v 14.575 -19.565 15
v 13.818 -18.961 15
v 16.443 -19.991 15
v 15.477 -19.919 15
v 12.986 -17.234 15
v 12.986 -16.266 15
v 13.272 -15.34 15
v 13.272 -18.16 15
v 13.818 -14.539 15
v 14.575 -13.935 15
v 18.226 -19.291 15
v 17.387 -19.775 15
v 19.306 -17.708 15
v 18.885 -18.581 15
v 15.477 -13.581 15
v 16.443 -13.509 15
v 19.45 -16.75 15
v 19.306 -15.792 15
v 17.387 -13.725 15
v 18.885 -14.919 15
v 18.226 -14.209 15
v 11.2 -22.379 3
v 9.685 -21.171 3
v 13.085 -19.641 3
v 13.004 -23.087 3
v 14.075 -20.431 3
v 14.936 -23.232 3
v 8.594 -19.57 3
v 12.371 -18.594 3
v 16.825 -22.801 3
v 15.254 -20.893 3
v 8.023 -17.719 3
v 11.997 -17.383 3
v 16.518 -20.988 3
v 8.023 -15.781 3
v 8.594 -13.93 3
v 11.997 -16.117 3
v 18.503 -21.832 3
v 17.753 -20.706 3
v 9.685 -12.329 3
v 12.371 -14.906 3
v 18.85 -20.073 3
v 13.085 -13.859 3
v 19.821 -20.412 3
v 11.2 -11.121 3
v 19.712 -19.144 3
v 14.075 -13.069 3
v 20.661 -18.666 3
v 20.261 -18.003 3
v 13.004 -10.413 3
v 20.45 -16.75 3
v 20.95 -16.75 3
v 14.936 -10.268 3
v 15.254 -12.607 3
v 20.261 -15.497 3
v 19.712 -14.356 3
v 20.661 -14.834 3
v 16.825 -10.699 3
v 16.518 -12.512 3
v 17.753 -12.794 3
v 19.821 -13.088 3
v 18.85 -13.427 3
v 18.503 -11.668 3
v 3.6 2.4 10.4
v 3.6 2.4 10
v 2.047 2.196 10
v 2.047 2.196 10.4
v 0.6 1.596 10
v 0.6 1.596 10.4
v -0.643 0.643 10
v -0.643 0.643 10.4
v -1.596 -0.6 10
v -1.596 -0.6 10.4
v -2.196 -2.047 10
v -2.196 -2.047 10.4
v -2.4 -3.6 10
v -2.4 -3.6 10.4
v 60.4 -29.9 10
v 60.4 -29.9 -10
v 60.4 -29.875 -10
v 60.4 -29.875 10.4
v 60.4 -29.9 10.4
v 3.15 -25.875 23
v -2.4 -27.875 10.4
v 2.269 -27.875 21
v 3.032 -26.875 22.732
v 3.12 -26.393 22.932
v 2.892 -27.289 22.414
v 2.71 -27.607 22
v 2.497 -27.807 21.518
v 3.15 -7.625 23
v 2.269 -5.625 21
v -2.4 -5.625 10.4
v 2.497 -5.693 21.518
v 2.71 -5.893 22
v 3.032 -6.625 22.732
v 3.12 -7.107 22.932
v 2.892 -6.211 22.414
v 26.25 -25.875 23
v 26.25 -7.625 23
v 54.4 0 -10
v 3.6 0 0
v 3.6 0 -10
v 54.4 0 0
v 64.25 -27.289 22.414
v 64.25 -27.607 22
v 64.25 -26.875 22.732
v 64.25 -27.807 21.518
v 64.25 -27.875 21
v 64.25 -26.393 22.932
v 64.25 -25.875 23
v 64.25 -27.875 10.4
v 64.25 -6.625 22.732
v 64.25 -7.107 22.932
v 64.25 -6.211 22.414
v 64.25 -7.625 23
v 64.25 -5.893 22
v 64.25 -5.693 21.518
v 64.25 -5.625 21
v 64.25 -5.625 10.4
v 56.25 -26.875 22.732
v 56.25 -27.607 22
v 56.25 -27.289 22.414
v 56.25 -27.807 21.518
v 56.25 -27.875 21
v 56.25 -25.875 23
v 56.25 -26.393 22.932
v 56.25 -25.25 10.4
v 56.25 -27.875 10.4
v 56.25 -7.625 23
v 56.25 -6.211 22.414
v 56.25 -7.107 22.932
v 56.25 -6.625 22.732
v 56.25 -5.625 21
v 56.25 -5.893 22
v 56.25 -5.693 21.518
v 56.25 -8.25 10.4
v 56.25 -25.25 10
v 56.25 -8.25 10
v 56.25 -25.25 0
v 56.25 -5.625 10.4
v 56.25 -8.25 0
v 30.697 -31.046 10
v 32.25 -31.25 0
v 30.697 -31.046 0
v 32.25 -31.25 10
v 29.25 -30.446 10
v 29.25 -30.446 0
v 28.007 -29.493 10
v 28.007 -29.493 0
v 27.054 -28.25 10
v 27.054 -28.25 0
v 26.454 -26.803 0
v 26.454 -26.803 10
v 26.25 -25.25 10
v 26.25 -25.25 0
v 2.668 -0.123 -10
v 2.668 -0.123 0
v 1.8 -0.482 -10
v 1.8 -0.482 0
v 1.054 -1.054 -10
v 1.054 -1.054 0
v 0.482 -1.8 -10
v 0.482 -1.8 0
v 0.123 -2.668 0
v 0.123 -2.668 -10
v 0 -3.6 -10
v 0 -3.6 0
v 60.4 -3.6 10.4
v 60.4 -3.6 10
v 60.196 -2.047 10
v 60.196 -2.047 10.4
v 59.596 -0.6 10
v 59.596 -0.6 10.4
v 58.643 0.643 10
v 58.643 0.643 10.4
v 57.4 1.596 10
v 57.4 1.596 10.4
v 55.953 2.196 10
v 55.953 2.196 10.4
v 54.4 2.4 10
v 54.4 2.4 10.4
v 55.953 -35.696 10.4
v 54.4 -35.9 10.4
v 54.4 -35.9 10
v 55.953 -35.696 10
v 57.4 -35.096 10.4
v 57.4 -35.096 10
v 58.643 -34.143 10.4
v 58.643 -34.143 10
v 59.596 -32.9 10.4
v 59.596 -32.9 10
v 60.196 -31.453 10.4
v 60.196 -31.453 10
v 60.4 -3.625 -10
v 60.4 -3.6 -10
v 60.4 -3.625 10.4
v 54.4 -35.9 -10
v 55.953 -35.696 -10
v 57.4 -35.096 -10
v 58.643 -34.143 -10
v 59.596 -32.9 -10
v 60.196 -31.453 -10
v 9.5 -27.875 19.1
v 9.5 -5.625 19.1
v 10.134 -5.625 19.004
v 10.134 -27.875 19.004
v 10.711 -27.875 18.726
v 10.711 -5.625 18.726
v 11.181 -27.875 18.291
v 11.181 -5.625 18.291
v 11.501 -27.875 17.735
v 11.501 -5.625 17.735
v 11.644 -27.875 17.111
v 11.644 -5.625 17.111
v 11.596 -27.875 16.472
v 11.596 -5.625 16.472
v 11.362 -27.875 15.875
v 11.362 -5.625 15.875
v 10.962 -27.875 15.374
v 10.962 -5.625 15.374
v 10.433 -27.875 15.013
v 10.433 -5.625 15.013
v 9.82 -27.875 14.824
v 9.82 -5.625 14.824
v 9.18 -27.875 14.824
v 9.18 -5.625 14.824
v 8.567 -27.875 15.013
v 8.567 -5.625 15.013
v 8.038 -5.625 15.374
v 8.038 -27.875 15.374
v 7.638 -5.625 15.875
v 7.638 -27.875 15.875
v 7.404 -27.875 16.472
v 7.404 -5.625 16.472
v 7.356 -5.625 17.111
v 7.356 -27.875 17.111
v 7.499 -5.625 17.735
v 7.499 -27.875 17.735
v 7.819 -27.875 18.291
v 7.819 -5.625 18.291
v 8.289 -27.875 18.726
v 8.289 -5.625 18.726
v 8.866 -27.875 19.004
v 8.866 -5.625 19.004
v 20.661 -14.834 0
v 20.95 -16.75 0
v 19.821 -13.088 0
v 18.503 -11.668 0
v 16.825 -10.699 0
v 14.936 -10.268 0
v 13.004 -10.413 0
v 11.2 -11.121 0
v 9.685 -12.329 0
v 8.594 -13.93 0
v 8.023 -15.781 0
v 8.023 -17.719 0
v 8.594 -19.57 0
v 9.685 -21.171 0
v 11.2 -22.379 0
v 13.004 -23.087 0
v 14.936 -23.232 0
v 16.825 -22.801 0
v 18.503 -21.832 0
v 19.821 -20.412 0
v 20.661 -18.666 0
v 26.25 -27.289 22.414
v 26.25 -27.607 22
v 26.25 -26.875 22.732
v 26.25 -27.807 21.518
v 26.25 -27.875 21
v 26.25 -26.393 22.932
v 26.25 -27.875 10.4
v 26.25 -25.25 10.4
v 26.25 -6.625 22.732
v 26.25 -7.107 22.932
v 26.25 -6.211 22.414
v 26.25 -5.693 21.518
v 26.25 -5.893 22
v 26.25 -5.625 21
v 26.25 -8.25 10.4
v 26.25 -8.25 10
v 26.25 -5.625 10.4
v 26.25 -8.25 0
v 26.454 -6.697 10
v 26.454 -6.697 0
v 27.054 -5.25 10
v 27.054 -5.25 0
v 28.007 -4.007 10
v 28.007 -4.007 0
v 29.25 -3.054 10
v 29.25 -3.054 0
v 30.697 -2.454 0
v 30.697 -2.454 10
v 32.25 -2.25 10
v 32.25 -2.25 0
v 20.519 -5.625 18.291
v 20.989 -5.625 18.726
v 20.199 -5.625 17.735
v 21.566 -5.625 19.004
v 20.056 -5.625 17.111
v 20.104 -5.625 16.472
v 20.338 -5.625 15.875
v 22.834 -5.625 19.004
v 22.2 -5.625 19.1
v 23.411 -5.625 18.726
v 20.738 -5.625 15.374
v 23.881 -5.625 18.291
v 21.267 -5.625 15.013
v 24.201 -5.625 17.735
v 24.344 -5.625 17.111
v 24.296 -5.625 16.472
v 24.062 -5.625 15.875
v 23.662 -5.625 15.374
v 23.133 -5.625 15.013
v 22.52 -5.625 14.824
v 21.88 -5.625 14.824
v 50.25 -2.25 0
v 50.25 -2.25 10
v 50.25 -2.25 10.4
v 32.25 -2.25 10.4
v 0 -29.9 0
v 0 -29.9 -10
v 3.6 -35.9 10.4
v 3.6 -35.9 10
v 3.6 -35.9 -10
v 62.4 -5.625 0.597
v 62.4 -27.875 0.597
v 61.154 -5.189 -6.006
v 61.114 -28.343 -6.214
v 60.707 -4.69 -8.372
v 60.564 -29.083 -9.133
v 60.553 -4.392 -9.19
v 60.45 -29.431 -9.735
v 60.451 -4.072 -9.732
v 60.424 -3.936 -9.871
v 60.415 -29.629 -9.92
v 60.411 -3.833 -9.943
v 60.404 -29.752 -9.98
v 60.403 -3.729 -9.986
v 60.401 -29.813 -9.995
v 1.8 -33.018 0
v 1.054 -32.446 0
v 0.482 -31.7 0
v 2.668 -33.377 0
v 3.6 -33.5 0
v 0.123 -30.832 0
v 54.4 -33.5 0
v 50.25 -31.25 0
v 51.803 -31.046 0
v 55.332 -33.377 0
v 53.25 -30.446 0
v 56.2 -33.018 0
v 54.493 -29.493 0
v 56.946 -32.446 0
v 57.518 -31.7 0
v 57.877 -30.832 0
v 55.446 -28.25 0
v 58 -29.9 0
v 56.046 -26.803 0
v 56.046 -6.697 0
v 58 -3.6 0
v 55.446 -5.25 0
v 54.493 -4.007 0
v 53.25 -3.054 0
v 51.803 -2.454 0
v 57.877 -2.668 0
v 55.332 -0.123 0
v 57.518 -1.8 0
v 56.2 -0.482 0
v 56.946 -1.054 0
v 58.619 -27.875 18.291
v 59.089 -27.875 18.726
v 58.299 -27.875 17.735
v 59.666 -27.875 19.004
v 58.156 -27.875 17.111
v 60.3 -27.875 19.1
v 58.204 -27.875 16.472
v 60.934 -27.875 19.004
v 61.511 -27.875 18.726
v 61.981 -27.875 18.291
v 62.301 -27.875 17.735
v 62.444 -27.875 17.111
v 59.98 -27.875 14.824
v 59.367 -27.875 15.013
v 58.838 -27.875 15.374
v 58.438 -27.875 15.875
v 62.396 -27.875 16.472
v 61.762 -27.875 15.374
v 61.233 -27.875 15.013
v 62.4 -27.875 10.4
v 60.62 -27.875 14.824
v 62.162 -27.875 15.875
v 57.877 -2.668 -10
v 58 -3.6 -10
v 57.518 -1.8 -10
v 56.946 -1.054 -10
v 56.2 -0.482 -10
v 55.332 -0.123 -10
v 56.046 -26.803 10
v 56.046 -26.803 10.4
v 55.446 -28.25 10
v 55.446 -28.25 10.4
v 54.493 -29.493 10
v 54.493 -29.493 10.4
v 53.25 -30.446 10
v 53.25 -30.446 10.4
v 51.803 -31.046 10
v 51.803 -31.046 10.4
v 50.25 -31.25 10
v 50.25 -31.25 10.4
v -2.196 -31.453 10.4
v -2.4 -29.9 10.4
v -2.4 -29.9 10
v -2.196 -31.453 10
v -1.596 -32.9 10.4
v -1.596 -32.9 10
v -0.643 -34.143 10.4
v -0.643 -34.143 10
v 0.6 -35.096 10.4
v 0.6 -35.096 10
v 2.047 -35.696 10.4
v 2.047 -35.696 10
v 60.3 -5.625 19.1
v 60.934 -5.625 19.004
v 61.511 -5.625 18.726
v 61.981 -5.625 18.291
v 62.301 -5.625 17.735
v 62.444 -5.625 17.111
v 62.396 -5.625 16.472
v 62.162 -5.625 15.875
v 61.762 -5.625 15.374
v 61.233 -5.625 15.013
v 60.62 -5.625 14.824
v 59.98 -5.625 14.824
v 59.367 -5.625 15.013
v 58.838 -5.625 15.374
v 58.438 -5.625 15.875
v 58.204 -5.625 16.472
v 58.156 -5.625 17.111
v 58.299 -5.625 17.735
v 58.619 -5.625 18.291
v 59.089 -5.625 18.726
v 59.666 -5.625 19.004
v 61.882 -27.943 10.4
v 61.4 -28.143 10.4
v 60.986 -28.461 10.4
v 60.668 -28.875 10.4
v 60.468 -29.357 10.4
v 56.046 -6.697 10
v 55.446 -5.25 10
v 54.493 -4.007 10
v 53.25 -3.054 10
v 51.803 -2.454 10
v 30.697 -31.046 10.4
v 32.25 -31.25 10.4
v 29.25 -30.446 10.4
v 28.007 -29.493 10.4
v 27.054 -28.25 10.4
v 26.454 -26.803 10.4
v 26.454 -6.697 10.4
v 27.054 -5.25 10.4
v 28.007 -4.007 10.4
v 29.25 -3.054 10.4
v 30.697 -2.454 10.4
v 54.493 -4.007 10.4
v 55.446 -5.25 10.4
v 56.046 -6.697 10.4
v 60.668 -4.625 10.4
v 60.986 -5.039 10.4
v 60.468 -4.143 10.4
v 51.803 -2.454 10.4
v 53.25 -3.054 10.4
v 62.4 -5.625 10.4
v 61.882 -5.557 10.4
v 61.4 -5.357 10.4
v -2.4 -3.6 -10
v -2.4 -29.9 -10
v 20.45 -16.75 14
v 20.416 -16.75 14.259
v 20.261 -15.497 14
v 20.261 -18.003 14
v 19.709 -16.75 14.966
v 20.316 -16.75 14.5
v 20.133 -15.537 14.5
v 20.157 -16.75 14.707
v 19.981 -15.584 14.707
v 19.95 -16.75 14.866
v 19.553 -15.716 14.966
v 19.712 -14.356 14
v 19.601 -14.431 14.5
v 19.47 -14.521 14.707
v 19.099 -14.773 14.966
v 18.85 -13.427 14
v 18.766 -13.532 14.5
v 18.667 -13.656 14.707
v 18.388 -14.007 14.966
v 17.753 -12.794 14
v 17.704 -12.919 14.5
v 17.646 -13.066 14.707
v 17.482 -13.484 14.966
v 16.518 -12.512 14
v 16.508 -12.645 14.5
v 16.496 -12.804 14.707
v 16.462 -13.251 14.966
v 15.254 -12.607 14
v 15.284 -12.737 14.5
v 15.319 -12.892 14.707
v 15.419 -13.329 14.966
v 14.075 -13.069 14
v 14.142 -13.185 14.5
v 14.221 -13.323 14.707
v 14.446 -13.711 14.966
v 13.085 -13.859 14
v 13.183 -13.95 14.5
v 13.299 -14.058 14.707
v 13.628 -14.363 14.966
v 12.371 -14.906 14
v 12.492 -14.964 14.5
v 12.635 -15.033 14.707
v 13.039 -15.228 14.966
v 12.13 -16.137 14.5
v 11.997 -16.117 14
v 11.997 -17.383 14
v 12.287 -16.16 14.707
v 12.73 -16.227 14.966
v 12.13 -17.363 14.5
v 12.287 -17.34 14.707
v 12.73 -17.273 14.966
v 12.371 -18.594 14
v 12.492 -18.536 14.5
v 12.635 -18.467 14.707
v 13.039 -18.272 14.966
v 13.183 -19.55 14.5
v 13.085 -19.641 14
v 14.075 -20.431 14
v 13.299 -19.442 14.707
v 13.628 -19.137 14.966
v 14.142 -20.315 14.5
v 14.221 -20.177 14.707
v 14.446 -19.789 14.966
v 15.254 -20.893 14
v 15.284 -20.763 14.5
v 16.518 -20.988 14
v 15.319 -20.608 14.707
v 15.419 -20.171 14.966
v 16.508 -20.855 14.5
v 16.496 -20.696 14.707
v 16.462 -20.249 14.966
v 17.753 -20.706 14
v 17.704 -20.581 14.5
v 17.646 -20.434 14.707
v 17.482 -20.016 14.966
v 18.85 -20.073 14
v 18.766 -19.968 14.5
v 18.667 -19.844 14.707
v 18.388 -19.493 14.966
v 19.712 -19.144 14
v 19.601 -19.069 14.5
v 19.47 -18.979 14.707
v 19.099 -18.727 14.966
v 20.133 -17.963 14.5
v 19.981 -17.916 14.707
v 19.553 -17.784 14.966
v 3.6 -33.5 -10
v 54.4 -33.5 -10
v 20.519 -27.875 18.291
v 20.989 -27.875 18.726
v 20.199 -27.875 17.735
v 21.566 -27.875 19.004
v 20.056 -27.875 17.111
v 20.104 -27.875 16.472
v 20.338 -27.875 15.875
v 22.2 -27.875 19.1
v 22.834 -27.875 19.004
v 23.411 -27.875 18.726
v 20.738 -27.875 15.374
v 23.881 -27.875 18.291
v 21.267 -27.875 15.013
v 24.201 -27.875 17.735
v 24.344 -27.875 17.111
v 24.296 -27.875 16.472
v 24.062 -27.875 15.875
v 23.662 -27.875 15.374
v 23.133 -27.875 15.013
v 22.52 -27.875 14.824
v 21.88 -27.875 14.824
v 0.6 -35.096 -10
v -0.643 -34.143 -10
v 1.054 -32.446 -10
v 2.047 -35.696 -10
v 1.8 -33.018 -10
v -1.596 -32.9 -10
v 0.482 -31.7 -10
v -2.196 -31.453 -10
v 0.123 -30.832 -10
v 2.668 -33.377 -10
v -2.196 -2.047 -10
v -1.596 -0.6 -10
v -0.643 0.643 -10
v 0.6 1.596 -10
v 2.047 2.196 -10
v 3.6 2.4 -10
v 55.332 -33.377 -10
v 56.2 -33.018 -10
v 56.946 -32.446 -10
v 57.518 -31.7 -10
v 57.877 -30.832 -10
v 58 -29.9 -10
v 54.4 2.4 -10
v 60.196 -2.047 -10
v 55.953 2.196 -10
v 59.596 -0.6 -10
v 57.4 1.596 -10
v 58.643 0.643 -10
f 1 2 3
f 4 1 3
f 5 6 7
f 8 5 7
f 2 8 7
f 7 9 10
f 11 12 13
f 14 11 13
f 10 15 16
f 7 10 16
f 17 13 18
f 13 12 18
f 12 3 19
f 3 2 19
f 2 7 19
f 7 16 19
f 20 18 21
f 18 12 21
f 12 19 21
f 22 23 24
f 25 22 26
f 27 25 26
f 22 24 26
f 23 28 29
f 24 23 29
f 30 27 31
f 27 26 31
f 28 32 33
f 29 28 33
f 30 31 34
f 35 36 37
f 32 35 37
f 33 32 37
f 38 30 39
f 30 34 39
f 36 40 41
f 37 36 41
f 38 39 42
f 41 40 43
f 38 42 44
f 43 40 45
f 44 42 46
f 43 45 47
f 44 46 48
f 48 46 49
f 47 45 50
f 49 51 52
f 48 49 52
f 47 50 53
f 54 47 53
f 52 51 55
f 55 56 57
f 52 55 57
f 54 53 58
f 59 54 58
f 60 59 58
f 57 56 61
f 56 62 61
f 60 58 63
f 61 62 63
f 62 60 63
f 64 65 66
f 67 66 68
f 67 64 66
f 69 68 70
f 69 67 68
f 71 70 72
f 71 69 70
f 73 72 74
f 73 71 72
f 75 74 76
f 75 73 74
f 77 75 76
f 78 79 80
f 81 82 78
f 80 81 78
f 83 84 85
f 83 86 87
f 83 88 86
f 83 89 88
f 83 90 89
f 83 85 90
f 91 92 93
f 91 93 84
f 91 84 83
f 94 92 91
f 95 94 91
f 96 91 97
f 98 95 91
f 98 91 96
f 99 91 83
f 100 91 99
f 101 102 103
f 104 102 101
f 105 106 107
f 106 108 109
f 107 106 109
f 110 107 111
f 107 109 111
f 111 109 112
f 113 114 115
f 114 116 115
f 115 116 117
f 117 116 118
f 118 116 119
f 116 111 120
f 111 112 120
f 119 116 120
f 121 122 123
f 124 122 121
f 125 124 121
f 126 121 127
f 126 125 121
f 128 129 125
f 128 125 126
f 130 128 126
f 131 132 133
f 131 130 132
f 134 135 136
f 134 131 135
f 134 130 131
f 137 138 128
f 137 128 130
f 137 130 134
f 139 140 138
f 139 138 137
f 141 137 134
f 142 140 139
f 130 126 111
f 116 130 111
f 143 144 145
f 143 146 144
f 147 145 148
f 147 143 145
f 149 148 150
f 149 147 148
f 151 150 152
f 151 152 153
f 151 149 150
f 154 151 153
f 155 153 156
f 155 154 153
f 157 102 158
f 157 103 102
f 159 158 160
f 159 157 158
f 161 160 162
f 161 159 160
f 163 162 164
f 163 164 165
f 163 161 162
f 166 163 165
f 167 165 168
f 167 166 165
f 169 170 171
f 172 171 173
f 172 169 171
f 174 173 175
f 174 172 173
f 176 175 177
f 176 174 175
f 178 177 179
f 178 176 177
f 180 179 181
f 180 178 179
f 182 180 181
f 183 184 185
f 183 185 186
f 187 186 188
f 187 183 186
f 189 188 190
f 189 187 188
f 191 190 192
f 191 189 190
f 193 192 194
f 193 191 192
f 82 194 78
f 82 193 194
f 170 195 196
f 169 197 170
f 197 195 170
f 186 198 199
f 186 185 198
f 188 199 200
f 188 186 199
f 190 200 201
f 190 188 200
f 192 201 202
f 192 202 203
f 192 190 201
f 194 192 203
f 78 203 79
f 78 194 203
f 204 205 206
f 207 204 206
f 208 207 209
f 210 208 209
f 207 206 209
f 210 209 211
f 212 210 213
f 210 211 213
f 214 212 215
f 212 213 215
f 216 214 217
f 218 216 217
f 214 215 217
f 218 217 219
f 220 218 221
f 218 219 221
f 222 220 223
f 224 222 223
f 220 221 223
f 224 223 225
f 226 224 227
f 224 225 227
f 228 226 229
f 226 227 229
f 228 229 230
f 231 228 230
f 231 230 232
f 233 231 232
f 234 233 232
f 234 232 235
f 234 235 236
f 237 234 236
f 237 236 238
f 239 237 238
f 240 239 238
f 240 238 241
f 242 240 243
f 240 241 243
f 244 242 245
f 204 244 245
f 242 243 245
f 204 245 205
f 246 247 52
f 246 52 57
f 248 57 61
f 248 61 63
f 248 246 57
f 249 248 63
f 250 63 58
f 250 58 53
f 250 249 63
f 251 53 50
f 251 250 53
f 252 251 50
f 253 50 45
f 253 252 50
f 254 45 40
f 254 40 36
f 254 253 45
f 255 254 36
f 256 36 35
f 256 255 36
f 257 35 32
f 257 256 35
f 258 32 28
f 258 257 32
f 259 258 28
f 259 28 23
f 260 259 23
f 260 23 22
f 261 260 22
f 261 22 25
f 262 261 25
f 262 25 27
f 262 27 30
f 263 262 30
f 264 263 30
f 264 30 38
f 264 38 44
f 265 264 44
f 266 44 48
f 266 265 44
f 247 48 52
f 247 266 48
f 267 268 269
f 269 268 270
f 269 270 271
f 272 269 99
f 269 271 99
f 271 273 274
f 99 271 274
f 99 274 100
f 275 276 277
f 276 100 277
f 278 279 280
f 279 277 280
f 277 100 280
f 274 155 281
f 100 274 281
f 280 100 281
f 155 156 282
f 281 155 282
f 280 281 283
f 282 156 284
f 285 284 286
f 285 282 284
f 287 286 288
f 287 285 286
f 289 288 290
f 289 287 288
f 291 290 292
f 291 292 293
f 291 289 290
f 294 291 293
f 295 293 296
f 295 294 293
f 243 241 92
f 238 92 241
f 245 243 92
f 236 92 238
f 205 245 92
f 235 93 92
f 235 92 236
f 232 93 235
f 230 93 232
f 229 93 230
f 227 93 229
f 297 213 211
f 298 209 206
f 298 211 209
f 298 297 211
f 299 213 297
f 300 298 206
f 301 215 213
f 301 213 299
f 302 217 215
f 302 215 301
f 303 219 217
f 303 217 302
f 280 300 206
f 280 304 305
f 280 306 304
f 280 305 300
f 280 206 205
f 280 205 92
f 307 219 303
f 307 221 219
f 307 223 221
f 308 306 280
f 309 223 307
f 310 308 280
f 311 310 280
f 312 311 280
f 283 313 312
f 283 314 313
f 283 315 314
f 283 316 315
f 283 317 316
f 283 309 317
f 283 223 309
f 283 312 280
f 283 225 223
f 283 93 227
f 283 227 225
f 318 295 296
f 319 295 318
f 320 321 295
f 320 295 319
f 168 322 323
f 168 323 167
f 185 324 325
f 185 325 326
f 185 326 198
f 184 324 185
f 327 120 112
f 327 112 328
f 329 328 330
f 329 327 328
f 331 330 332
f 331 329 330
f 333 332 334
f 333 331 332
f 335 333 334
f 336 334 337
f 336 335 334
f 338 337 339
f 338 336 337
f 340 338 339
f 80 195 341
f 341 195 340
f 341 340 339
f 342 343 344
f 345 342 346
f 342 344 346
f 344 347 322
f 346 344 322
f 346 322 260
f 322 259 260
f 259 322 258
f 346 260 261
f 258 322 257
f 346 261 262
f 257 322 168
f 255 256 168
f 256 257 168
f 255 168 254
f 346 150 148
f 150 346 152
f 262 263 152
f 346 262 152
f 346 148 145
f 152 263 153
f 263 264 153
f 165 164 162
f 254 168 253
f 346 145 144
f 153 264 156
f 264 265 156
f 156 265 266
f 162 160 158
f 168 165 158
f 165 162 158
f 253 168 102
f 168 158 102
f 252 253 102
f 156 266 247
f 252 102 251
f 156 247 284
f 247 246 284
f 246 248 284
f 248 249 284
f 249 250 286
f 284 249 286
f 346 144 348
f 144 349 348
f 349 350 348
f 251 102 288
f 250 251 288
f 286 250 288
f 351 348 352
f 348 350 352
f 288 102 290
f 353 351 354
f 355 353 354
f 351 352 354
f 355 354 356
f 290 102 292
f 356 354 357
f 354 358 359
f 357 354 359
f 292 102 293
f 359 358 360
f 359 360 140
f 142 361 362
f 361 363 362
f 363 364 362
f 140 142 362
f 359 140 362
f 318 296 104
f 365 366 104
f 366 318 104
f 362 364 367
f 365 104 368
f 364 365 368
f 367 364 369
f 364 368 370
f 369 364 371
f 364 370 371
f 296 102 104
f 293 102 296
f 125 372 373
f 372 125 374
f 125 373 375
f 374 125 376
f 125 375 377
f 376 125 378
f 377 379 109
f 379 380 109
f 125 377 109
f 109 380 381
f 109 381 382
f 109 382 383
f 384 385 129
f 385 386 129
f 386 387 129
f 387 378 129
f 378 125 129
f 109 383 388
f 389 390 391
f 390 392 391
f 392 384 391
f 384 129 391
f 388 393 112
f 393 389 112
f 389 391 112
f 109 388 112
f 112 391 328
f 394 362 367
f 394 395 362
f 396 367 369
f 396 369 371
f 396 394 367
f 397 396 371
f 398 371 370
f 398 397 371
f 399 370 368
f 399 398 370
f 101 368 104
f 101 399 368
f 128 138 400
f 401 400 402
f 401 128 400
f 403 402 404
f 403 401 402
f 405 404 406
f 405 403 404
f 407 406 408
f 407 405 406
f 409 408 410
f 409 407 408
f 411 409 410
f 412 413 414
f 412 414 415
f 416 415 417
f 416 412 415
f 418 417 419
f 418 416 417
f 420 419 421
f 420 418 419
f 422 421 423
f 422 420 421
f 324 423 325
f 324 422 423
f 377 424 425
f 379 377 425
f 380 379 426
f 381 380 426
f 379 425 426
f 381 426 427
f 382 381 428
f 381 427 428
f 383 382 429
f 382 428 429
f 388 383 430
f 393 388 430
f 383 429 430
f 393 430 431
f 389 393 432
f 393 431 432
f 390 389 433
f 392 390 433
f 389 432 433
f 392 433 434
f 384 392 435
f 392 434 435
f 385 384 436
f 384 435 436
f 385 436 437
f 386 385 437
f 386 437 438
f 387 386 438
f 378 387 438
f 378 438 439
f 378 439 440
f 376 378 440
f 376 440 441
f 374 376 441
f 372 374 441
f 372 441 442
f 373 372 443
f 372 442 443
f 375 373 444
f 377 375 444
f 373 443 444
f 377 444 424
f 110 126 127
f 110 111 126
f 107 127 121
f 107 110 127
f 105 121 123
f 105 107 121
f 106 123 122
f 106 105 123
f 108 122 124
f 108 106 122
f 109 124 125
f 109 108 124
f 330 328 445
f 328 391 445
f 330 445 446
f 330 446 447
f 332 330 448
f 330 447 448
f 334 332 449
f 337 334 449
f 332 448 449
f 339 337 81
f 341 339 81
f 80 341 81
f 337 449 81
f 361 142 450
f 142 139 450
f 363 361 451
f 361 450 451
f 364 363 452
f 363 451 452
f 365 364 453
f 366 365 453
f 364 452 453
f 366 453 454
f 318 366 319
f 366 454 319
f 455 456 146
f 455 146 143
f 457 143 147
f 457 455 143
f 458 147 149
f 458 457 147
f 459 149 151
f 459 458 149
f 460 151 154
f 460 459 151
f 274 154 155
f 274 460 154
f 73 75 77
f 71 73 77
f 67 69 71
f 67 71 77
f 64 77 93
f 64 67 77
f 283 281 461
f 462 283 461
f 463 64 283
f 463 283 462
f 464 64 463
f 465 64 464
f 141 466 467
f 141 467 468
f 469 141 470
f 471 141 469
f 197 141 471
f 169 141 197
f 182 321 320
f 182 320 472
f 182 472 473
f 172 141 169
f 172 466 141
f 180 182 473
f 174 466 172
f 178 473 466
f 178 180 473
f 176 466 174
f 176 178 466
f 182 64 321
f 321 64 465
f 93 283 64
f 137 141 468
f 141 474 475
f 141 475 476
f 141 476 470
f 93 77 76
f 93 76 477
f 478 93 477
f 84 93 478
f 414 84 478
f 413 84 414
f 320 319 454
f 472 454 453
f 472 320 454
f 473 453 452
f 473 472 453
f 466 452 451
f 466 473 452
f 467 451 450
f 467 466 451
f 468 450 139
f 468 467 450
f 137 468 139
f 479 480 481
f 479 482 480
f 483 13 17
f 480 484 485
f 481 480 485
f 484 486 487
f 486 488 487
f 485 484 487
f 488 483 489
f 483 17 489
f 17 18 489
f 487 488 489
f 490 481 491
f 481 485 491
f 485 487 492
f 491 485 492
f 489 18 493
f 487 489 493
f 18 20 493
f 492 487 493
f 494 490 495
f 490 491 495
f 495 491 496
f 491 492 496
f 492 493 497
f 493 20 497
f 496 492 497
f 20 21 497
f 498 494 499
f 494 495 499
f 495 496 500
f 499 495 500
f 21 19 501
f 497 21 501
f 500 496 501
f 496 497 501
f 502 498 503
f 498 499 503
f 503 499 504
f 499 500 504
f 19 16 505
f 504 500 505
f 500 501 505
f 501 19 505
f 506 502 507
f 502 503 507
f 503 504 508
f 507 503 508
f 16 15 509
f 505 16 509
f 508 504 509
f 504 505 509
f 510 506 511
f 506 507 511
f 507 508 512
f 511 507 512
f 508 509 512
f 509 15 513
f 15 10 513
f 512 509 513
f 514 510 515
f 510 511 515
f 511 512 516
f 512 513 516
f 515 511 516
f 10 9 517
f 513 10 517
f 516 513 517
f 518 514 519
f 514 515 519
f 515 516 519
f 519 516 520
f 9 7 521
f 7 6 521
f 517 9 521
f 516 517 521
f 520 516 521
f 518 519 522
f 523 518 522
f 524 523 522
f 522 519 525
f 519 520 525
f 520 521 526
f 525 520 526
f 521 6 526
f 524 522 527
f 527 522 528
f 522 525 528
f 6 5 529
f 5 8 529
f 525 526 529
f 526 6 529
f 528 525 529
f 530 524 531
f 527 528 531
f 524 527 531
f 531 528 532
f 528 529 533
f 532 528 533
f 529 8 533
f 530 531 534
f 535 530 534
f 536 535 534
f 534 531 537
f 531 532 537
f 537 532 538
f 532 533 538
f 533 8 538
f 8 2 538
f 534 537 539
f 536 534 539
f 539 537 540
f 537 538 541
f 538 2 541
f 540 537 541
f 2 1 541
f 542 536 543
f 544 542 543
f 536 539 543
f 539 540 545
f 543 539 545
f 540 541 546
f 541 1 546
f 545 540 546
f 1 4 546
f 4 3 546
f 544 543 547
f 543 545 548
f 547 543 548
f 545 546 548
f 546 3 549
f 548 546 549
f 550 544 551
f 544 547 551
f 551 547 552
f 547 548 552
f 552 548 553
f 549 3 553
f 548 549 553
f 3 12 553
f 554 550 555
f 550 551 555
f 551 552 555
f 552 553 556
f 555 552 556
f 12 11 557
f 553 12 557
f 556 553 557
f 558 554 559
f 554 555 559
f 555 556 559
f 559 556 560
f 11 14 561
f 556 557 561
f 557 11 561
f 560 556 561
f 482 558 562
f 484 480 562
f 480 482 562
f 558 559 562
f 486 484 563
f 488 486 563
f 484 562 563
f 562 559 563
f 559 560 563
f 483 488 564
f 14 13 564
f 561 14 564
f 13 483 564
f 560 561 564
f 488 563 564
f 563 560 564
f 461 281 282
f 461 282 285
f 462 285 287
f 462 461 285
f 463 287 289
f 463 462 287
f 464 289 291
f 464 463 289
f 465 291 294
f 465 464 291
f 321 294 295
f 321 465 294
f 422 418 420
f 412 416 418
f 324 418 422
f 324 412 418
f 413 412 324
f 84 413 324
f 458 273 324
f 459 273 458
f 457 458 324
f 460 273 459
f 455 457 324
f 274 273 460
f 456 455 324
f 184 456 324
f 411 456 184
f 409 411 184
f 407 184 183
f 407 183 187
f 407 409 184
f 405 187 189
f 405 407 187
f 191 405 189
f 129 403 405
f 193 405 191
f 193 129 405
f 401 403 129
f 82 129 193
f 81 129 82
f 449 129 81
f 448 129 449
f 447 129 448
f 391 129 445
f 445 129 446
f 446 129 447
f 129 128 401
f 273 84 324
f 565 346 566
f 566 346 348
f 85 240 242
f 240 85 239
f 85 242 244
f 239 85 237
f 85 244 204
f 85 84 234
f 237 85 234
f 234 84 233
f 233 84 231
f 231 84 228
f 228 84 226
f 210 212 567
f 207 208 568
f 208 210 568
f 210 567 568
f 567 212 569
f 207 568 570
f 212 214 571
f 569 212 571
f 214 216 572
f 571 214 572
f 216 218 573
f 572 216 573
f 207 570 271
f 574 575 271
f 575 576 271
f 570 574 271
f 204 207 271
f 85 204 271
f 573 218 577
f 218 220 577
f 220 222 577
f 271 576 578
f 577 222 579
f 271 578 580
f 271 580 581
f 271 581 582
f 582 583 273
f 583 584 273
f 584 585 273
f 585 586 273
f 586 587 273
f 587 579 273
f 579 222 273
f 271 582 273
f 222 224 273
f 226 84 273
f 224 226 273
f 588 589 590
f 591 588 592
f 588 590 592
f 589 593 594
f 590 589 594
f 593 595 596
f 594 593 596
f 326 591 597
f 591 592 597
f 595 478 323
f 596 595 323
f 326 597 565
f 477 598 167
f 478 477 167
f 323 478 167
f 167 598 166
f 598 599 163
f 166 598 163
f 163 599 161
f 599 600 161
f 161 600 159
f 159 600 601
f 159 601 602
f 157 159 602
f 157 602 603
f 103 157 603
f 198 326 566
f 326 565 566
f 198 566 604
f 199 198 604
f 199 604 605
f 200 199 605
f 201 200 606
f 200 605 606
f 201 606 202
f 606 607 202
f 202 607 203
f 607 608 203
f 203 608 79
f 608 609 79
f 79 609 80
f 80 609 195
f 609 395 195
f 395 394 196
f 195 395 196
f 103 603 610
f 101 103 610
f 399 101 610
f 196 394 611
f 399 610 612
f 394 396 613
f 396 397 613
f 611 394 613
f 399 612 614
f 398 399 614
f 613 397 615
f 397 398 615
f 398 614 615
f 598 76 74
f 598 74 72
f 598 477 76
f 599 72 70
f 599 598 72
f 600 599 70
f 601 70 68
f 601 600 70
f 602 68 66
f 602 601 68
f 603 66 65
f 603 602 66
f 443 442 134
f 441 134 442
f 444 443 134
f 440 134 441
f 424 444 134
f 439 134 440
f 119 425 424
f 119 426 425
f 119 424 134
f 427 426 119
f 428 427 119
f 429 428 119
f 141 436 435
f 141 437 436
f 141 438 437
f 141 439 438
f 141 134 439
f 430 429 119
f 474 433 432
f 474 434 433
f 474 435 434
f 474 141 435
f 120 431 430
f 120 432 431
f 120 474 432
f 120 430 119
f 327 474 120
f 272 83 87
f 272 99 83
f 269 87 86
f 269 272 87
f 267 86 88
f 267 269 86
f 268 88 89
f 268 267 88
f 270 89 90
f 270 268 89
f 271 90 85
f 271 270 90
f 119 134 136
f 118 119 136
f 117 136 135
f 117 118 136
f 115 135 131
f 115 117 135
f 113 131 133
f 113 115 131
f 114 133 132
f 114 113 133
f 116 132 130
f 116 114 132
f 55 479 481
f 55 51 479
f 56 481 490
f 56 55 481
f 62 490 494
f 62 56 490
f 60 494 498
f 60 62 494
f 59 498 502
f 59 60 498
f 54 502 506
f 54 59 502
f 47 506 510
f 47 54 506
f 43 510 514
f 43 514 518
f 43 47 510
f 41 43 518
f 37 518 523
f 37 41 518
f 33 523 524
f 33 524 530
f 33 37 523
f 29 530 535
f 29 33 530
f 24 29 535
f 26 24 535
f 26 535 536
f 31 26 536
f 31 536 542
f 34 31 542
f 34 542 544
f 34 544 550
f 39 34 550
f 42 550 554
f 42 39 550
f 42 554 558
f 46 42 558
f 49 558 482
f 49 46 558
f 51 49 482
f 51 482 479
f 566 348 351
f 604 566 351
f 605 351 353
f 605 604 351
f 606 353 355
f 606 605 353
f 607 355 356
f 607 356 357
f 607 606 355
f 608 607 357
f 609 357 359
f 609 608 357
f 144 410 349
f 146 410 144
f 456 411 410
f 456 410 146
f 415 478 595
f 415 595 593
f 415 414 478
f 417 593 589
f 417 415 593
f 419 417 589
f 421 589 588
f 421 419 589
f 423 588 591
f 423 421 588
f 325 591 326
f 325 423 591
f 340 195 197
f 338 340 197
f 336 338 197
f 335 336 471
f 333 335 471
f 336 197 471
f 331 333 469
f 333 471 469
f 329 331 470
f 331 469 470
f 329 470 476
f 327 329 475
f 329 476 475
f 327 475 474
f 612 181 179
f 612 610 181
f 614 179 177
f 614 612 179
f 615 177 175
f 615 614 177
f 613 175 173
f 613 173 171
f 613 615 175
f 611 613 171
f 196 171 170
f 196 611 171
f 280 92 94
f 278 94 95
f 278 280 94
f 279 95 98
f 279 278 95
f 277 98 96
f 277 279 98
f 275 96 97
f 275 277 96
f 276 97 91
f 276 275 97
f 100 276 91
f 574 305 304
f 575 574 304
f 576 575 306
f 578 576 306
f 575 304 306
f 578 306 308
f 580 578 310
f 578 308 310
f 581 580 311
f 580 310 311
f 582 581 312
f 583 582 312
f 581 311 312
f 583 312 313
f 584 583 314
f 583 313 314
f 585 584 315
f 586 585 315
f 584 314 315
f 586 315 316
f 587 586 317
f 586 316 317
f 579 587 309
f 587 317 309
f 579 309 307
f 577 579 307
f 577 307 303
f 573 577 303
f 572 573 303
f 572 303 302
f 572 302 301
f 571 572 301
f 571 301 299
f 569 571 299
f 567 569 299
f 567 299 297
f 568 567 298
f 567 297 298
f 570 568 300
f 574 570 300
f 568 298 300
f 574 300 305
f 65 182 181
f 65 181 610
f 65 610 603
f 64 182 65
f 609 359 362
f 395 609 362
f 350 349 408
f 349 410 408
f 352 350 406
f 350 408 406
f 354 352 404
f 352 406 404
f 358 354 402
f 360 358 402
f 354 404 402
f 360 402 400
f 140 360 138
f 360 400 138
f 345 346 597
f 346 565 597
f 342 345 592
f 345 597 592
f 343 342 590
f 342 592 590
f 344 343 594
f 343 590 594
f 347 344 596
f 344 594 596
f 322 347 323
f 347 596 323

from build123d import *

# Parameters (mm, degrees)
SKETCH2_W           = 62.8
SKETCH2_H           = 38.3
SKETCH2_R           = 4.25
SKETCH2_W_2         = 30
SKETCH2_H_2         = 29
BOSS_EXTRUDE1_DEPTH = 10
SKETCH2_3_W         = 62.8
SKETCH2_3_H         = 38.3
SKETCH2_3_W_2       = 58
SKETCH2_3_H_2       = 33.5
BOSS_EXTRUDE2_DEPTH = 10
SKETCH2_4_R         = 6.5
CUT_EXTRUDE1_DEPTH  = 3
FILLET1_R           = 3.6
FILLET2_R           = 6
BOSS_EXTRUDE3_START = 0.4
SKETCH4_R           = 4.25
BOSS_EXTRUDE3_DEPTH = 0.4
SKETCH5_W           = 23.1
SKETCH5_H           = 22.25
SKETCH5_W_2         = 8
BOSS_EXTRUDE4_DEPTH = 12.6
SKETCH6_R           = 2.15
CUT_EXTRUDE2_DEPTH  = 22.25
BOSS_EXTRUDE6_DEPTH = 22.25
FILLET5_R           = 2
FILLET6_R           = 2
SKETCH4_2_R         = 4.25
CUT_EXTRUDE3_DEPTH  = 5
FILLET7_R           = 1


with BuildPart() as part:
    # Sketch2 → Boss-Extrude1 (new body)
    with BuildSketch(Plane.XY):
        with Locations((29, -16.75)):
            Rectangle(SKETCH2_W, SKETCH2_H)
        with Locations((16.2, -16.75)):
            Circle(SKETCH2_R, mode=Mode.SUBTRACT)
        with Locations((41.25, -16.75)):
            Rectangle(SKETCH2_W_2, SKETCH2_H_2, mode=Mode.SUBTRACT)
    extrude(amount=BOSS_EXTRUDE1_DEPTH)

    # Sketch2<3> → Boss-Extrude2 (add)
    with BuildSketch(Plane.XY):
        with Locations((29, -16.75)):
            Rectangle(SKETCH2_3_W, SKETCH2_3_H)
        with Locations((29, -16.75)):
            Rectangle(SKETCH2_3_W_2, SKETCH2_3_H_2, mode=Mode.SUBTRACT)
    extrude(amount=-BOSS_EXTRUDE2_DEPTH)

    # Sketch2<4> → Cut-Extrude1 (cut)
    with BuildSketch(Plane.XY):
        with Locations((14.45, -16.75)):
            Circle(SKETCH2_4_R)
    extrude(amount=CUT_EXTRUDE1_DEPTH, mode=Mode.SUBTRACT)

    # Fillet1
    fillet1_edges = [part.edges().sort_by_distance(p)[0] for p in [
        (58, 0, -5),
        (0, 0, -5),
        (0, -33.5, -5),
        (58, -33.5, -5),
    ]]
    fillet(fillet1_edges, radius=FILLET1_R)

    # Fillet2
    fillet2_edges = [part.edges().sort_by_distance(p)[0] for p in [
        (26.25, -2.25, 5),
        (26.25, -31.25, 5),
        (56.25, -31.25, 5),
        (56.25, -2.25, 5),
        (60.4, -35.9, 0),
        (-2.4, -35.9, 0),
        (-2.4, 2.4, 0),
        (60.4, 2.4, 0),
    ]]
    fillet(fillet2_edges, radius=FILLET2_R)

    # Sketch4 → Boss-Extrude3 (add)
    with BuildSketch(Plane.XY.offset(10).offset(BOSS_EXTRUDE3_START)):
        with BuildLine():
            Line((3.6, -35.9), (54.4, -35.9))
            ThreePointArc((54.4, -35.9), (58.642640687, -34.142640687), (60.4, -29.9))
            Line((60.4, -29.9), (60.4, -3.6))
            ThreePointArc((60.4, -3.6), (58.642640687, 0.642640687), (54.4, 2.4))
            Line((54.4, 2.4), (3.6, 2.4))
            ThreePointArc((3.6, 2.4), (-0.642640687, 0.642640687), (-2.4, -3.6))
            Line((-2.4, -3.6), (-2.4, -29.9))
            ThreePointArc((-2.4, -29.9), (-0.642640687, -34.142640687), (3.6, -35.9))
        make_face()
        with Locations((16.2, -16.75)):
            Circle(SKETCH4_R, mode=Mode.SUBTRACT)
        with BuildLine():
            Line((56.25, -8.25), (56.25, -25.25))
            ThreePointArc((56.25, -25.25), (54.492640687, -29.492640687), (50.25, -31.25))
            Line((50.25, -31.25), (32.25, -31.25))
            ThreePointArc((32.25, -31.25), (28.007359313, -29.492640687), (26.25, -25.25))
            Line((26.25, -25.25), (26.25, -8.25))
            ThreePointArc((26.25, -8.25), (28.007359313, -4.007359313), (32.25, -2.25))
            Line((32.25, -2.25), (50.25, -2.25))
            ThreePointArc((50.25, -2.25), (54.492640687, -4.007359313), (56.25, -8.25))
        make_face(mode=Mode.SUBTRACT)
    extrude(amount=-BOSS_EXTRUDE3_DEPTH)

    # Sketch5 → Boss-Extrude4 (add)
    with BuildSketch(Plane.XY.offset(10.4)):
        with Locations((14.7, -16.75)):
            Rectangle(SKETCH5_W, SKETCH5_H)
        with Locations((60.25, -16.75)):
            Rectangle(SKETCH5_W_2, SKETCH5_H)
    extrude(amount=BOSS_EXTRUDE4_DEPTH)

    # Sketch6 → Cut-Extrude2 (cut)
    with BuildSketch(Plane(origin=(0, -5.625, 0), x_dir=(1, 0, 0), z_dir=(0, 1, 0))):
        with Locations(Location((9.5, -16.95, 0), (0, 0, 270))):
            Circle(SKETCH6_R)
        with Locations(Location((22.2, -16.95, 0), (0, 0, 270))):
            Circle(SKETCH6_R)
        with Locations(Location((60.3, -16.95, 0), (0, 0, 270))):
            Circle(SKETCH6_R)
    extrude(amount=-CUT_EXTRUDE2_DEPTH, mode=Mode.SUBTRACT)

    # Sketch7 → Boss-Extrude6 (add)
    with BuildSketch(Plane(origin=(0, -5.625, 0), x_dir=(1, 0, 0), z_dir=(0, 1, 0))):
        Polygon((-2.4, -10.4), (3.15, -23), (3.15, -10.4), align=None)
        Polygon((60.4, -10.4), (64.25, -10.4), (60.4, 10), align=None)
    extrude(amount=-BOSS_EXTRUDE6_DEPTH)

    # Fillet5
    fillet5_edges = [part.edges().sort_by_distance(p)[0] for p in [
        (60.4, -27.875, 0.2),
        (60.4, -5.625, 0.2),
    ]]
    fillet(fillet5_edges, radius=FILLET5_R)

    # Fillet6
    fillet6_edges = [part.edges().sort_by_distance(p)[0] for p in [
        (60.25, -5.625, 23),
        (60.25, -27.875, 23),
        (14.7, -5.625, 23),
        (14.7, -27.875, 23),
    ]]
    fillet(fillet6_edges, radius=FILLET6_R)

    # Sketch4<2> → Cut-Extrude3 (cut)
    with BuildSketch(Plane.XY.offset(10)):
        with Locations((16.2, -16.75)):
            Circle(SKETCH4_2_R)
    extrude(amount=CUT_EXTRUDE3_DEPTH, mode=Mode.SUBTRACT)

    # Fillet7
    fillet7_edges = [part.edges().sort_by_distance(p)[0] for p in [
        (11.95, -16.75, 15),
    ]]
    fillet(fillet7_edges, radius=FILLET7_R)


solid = part.part
